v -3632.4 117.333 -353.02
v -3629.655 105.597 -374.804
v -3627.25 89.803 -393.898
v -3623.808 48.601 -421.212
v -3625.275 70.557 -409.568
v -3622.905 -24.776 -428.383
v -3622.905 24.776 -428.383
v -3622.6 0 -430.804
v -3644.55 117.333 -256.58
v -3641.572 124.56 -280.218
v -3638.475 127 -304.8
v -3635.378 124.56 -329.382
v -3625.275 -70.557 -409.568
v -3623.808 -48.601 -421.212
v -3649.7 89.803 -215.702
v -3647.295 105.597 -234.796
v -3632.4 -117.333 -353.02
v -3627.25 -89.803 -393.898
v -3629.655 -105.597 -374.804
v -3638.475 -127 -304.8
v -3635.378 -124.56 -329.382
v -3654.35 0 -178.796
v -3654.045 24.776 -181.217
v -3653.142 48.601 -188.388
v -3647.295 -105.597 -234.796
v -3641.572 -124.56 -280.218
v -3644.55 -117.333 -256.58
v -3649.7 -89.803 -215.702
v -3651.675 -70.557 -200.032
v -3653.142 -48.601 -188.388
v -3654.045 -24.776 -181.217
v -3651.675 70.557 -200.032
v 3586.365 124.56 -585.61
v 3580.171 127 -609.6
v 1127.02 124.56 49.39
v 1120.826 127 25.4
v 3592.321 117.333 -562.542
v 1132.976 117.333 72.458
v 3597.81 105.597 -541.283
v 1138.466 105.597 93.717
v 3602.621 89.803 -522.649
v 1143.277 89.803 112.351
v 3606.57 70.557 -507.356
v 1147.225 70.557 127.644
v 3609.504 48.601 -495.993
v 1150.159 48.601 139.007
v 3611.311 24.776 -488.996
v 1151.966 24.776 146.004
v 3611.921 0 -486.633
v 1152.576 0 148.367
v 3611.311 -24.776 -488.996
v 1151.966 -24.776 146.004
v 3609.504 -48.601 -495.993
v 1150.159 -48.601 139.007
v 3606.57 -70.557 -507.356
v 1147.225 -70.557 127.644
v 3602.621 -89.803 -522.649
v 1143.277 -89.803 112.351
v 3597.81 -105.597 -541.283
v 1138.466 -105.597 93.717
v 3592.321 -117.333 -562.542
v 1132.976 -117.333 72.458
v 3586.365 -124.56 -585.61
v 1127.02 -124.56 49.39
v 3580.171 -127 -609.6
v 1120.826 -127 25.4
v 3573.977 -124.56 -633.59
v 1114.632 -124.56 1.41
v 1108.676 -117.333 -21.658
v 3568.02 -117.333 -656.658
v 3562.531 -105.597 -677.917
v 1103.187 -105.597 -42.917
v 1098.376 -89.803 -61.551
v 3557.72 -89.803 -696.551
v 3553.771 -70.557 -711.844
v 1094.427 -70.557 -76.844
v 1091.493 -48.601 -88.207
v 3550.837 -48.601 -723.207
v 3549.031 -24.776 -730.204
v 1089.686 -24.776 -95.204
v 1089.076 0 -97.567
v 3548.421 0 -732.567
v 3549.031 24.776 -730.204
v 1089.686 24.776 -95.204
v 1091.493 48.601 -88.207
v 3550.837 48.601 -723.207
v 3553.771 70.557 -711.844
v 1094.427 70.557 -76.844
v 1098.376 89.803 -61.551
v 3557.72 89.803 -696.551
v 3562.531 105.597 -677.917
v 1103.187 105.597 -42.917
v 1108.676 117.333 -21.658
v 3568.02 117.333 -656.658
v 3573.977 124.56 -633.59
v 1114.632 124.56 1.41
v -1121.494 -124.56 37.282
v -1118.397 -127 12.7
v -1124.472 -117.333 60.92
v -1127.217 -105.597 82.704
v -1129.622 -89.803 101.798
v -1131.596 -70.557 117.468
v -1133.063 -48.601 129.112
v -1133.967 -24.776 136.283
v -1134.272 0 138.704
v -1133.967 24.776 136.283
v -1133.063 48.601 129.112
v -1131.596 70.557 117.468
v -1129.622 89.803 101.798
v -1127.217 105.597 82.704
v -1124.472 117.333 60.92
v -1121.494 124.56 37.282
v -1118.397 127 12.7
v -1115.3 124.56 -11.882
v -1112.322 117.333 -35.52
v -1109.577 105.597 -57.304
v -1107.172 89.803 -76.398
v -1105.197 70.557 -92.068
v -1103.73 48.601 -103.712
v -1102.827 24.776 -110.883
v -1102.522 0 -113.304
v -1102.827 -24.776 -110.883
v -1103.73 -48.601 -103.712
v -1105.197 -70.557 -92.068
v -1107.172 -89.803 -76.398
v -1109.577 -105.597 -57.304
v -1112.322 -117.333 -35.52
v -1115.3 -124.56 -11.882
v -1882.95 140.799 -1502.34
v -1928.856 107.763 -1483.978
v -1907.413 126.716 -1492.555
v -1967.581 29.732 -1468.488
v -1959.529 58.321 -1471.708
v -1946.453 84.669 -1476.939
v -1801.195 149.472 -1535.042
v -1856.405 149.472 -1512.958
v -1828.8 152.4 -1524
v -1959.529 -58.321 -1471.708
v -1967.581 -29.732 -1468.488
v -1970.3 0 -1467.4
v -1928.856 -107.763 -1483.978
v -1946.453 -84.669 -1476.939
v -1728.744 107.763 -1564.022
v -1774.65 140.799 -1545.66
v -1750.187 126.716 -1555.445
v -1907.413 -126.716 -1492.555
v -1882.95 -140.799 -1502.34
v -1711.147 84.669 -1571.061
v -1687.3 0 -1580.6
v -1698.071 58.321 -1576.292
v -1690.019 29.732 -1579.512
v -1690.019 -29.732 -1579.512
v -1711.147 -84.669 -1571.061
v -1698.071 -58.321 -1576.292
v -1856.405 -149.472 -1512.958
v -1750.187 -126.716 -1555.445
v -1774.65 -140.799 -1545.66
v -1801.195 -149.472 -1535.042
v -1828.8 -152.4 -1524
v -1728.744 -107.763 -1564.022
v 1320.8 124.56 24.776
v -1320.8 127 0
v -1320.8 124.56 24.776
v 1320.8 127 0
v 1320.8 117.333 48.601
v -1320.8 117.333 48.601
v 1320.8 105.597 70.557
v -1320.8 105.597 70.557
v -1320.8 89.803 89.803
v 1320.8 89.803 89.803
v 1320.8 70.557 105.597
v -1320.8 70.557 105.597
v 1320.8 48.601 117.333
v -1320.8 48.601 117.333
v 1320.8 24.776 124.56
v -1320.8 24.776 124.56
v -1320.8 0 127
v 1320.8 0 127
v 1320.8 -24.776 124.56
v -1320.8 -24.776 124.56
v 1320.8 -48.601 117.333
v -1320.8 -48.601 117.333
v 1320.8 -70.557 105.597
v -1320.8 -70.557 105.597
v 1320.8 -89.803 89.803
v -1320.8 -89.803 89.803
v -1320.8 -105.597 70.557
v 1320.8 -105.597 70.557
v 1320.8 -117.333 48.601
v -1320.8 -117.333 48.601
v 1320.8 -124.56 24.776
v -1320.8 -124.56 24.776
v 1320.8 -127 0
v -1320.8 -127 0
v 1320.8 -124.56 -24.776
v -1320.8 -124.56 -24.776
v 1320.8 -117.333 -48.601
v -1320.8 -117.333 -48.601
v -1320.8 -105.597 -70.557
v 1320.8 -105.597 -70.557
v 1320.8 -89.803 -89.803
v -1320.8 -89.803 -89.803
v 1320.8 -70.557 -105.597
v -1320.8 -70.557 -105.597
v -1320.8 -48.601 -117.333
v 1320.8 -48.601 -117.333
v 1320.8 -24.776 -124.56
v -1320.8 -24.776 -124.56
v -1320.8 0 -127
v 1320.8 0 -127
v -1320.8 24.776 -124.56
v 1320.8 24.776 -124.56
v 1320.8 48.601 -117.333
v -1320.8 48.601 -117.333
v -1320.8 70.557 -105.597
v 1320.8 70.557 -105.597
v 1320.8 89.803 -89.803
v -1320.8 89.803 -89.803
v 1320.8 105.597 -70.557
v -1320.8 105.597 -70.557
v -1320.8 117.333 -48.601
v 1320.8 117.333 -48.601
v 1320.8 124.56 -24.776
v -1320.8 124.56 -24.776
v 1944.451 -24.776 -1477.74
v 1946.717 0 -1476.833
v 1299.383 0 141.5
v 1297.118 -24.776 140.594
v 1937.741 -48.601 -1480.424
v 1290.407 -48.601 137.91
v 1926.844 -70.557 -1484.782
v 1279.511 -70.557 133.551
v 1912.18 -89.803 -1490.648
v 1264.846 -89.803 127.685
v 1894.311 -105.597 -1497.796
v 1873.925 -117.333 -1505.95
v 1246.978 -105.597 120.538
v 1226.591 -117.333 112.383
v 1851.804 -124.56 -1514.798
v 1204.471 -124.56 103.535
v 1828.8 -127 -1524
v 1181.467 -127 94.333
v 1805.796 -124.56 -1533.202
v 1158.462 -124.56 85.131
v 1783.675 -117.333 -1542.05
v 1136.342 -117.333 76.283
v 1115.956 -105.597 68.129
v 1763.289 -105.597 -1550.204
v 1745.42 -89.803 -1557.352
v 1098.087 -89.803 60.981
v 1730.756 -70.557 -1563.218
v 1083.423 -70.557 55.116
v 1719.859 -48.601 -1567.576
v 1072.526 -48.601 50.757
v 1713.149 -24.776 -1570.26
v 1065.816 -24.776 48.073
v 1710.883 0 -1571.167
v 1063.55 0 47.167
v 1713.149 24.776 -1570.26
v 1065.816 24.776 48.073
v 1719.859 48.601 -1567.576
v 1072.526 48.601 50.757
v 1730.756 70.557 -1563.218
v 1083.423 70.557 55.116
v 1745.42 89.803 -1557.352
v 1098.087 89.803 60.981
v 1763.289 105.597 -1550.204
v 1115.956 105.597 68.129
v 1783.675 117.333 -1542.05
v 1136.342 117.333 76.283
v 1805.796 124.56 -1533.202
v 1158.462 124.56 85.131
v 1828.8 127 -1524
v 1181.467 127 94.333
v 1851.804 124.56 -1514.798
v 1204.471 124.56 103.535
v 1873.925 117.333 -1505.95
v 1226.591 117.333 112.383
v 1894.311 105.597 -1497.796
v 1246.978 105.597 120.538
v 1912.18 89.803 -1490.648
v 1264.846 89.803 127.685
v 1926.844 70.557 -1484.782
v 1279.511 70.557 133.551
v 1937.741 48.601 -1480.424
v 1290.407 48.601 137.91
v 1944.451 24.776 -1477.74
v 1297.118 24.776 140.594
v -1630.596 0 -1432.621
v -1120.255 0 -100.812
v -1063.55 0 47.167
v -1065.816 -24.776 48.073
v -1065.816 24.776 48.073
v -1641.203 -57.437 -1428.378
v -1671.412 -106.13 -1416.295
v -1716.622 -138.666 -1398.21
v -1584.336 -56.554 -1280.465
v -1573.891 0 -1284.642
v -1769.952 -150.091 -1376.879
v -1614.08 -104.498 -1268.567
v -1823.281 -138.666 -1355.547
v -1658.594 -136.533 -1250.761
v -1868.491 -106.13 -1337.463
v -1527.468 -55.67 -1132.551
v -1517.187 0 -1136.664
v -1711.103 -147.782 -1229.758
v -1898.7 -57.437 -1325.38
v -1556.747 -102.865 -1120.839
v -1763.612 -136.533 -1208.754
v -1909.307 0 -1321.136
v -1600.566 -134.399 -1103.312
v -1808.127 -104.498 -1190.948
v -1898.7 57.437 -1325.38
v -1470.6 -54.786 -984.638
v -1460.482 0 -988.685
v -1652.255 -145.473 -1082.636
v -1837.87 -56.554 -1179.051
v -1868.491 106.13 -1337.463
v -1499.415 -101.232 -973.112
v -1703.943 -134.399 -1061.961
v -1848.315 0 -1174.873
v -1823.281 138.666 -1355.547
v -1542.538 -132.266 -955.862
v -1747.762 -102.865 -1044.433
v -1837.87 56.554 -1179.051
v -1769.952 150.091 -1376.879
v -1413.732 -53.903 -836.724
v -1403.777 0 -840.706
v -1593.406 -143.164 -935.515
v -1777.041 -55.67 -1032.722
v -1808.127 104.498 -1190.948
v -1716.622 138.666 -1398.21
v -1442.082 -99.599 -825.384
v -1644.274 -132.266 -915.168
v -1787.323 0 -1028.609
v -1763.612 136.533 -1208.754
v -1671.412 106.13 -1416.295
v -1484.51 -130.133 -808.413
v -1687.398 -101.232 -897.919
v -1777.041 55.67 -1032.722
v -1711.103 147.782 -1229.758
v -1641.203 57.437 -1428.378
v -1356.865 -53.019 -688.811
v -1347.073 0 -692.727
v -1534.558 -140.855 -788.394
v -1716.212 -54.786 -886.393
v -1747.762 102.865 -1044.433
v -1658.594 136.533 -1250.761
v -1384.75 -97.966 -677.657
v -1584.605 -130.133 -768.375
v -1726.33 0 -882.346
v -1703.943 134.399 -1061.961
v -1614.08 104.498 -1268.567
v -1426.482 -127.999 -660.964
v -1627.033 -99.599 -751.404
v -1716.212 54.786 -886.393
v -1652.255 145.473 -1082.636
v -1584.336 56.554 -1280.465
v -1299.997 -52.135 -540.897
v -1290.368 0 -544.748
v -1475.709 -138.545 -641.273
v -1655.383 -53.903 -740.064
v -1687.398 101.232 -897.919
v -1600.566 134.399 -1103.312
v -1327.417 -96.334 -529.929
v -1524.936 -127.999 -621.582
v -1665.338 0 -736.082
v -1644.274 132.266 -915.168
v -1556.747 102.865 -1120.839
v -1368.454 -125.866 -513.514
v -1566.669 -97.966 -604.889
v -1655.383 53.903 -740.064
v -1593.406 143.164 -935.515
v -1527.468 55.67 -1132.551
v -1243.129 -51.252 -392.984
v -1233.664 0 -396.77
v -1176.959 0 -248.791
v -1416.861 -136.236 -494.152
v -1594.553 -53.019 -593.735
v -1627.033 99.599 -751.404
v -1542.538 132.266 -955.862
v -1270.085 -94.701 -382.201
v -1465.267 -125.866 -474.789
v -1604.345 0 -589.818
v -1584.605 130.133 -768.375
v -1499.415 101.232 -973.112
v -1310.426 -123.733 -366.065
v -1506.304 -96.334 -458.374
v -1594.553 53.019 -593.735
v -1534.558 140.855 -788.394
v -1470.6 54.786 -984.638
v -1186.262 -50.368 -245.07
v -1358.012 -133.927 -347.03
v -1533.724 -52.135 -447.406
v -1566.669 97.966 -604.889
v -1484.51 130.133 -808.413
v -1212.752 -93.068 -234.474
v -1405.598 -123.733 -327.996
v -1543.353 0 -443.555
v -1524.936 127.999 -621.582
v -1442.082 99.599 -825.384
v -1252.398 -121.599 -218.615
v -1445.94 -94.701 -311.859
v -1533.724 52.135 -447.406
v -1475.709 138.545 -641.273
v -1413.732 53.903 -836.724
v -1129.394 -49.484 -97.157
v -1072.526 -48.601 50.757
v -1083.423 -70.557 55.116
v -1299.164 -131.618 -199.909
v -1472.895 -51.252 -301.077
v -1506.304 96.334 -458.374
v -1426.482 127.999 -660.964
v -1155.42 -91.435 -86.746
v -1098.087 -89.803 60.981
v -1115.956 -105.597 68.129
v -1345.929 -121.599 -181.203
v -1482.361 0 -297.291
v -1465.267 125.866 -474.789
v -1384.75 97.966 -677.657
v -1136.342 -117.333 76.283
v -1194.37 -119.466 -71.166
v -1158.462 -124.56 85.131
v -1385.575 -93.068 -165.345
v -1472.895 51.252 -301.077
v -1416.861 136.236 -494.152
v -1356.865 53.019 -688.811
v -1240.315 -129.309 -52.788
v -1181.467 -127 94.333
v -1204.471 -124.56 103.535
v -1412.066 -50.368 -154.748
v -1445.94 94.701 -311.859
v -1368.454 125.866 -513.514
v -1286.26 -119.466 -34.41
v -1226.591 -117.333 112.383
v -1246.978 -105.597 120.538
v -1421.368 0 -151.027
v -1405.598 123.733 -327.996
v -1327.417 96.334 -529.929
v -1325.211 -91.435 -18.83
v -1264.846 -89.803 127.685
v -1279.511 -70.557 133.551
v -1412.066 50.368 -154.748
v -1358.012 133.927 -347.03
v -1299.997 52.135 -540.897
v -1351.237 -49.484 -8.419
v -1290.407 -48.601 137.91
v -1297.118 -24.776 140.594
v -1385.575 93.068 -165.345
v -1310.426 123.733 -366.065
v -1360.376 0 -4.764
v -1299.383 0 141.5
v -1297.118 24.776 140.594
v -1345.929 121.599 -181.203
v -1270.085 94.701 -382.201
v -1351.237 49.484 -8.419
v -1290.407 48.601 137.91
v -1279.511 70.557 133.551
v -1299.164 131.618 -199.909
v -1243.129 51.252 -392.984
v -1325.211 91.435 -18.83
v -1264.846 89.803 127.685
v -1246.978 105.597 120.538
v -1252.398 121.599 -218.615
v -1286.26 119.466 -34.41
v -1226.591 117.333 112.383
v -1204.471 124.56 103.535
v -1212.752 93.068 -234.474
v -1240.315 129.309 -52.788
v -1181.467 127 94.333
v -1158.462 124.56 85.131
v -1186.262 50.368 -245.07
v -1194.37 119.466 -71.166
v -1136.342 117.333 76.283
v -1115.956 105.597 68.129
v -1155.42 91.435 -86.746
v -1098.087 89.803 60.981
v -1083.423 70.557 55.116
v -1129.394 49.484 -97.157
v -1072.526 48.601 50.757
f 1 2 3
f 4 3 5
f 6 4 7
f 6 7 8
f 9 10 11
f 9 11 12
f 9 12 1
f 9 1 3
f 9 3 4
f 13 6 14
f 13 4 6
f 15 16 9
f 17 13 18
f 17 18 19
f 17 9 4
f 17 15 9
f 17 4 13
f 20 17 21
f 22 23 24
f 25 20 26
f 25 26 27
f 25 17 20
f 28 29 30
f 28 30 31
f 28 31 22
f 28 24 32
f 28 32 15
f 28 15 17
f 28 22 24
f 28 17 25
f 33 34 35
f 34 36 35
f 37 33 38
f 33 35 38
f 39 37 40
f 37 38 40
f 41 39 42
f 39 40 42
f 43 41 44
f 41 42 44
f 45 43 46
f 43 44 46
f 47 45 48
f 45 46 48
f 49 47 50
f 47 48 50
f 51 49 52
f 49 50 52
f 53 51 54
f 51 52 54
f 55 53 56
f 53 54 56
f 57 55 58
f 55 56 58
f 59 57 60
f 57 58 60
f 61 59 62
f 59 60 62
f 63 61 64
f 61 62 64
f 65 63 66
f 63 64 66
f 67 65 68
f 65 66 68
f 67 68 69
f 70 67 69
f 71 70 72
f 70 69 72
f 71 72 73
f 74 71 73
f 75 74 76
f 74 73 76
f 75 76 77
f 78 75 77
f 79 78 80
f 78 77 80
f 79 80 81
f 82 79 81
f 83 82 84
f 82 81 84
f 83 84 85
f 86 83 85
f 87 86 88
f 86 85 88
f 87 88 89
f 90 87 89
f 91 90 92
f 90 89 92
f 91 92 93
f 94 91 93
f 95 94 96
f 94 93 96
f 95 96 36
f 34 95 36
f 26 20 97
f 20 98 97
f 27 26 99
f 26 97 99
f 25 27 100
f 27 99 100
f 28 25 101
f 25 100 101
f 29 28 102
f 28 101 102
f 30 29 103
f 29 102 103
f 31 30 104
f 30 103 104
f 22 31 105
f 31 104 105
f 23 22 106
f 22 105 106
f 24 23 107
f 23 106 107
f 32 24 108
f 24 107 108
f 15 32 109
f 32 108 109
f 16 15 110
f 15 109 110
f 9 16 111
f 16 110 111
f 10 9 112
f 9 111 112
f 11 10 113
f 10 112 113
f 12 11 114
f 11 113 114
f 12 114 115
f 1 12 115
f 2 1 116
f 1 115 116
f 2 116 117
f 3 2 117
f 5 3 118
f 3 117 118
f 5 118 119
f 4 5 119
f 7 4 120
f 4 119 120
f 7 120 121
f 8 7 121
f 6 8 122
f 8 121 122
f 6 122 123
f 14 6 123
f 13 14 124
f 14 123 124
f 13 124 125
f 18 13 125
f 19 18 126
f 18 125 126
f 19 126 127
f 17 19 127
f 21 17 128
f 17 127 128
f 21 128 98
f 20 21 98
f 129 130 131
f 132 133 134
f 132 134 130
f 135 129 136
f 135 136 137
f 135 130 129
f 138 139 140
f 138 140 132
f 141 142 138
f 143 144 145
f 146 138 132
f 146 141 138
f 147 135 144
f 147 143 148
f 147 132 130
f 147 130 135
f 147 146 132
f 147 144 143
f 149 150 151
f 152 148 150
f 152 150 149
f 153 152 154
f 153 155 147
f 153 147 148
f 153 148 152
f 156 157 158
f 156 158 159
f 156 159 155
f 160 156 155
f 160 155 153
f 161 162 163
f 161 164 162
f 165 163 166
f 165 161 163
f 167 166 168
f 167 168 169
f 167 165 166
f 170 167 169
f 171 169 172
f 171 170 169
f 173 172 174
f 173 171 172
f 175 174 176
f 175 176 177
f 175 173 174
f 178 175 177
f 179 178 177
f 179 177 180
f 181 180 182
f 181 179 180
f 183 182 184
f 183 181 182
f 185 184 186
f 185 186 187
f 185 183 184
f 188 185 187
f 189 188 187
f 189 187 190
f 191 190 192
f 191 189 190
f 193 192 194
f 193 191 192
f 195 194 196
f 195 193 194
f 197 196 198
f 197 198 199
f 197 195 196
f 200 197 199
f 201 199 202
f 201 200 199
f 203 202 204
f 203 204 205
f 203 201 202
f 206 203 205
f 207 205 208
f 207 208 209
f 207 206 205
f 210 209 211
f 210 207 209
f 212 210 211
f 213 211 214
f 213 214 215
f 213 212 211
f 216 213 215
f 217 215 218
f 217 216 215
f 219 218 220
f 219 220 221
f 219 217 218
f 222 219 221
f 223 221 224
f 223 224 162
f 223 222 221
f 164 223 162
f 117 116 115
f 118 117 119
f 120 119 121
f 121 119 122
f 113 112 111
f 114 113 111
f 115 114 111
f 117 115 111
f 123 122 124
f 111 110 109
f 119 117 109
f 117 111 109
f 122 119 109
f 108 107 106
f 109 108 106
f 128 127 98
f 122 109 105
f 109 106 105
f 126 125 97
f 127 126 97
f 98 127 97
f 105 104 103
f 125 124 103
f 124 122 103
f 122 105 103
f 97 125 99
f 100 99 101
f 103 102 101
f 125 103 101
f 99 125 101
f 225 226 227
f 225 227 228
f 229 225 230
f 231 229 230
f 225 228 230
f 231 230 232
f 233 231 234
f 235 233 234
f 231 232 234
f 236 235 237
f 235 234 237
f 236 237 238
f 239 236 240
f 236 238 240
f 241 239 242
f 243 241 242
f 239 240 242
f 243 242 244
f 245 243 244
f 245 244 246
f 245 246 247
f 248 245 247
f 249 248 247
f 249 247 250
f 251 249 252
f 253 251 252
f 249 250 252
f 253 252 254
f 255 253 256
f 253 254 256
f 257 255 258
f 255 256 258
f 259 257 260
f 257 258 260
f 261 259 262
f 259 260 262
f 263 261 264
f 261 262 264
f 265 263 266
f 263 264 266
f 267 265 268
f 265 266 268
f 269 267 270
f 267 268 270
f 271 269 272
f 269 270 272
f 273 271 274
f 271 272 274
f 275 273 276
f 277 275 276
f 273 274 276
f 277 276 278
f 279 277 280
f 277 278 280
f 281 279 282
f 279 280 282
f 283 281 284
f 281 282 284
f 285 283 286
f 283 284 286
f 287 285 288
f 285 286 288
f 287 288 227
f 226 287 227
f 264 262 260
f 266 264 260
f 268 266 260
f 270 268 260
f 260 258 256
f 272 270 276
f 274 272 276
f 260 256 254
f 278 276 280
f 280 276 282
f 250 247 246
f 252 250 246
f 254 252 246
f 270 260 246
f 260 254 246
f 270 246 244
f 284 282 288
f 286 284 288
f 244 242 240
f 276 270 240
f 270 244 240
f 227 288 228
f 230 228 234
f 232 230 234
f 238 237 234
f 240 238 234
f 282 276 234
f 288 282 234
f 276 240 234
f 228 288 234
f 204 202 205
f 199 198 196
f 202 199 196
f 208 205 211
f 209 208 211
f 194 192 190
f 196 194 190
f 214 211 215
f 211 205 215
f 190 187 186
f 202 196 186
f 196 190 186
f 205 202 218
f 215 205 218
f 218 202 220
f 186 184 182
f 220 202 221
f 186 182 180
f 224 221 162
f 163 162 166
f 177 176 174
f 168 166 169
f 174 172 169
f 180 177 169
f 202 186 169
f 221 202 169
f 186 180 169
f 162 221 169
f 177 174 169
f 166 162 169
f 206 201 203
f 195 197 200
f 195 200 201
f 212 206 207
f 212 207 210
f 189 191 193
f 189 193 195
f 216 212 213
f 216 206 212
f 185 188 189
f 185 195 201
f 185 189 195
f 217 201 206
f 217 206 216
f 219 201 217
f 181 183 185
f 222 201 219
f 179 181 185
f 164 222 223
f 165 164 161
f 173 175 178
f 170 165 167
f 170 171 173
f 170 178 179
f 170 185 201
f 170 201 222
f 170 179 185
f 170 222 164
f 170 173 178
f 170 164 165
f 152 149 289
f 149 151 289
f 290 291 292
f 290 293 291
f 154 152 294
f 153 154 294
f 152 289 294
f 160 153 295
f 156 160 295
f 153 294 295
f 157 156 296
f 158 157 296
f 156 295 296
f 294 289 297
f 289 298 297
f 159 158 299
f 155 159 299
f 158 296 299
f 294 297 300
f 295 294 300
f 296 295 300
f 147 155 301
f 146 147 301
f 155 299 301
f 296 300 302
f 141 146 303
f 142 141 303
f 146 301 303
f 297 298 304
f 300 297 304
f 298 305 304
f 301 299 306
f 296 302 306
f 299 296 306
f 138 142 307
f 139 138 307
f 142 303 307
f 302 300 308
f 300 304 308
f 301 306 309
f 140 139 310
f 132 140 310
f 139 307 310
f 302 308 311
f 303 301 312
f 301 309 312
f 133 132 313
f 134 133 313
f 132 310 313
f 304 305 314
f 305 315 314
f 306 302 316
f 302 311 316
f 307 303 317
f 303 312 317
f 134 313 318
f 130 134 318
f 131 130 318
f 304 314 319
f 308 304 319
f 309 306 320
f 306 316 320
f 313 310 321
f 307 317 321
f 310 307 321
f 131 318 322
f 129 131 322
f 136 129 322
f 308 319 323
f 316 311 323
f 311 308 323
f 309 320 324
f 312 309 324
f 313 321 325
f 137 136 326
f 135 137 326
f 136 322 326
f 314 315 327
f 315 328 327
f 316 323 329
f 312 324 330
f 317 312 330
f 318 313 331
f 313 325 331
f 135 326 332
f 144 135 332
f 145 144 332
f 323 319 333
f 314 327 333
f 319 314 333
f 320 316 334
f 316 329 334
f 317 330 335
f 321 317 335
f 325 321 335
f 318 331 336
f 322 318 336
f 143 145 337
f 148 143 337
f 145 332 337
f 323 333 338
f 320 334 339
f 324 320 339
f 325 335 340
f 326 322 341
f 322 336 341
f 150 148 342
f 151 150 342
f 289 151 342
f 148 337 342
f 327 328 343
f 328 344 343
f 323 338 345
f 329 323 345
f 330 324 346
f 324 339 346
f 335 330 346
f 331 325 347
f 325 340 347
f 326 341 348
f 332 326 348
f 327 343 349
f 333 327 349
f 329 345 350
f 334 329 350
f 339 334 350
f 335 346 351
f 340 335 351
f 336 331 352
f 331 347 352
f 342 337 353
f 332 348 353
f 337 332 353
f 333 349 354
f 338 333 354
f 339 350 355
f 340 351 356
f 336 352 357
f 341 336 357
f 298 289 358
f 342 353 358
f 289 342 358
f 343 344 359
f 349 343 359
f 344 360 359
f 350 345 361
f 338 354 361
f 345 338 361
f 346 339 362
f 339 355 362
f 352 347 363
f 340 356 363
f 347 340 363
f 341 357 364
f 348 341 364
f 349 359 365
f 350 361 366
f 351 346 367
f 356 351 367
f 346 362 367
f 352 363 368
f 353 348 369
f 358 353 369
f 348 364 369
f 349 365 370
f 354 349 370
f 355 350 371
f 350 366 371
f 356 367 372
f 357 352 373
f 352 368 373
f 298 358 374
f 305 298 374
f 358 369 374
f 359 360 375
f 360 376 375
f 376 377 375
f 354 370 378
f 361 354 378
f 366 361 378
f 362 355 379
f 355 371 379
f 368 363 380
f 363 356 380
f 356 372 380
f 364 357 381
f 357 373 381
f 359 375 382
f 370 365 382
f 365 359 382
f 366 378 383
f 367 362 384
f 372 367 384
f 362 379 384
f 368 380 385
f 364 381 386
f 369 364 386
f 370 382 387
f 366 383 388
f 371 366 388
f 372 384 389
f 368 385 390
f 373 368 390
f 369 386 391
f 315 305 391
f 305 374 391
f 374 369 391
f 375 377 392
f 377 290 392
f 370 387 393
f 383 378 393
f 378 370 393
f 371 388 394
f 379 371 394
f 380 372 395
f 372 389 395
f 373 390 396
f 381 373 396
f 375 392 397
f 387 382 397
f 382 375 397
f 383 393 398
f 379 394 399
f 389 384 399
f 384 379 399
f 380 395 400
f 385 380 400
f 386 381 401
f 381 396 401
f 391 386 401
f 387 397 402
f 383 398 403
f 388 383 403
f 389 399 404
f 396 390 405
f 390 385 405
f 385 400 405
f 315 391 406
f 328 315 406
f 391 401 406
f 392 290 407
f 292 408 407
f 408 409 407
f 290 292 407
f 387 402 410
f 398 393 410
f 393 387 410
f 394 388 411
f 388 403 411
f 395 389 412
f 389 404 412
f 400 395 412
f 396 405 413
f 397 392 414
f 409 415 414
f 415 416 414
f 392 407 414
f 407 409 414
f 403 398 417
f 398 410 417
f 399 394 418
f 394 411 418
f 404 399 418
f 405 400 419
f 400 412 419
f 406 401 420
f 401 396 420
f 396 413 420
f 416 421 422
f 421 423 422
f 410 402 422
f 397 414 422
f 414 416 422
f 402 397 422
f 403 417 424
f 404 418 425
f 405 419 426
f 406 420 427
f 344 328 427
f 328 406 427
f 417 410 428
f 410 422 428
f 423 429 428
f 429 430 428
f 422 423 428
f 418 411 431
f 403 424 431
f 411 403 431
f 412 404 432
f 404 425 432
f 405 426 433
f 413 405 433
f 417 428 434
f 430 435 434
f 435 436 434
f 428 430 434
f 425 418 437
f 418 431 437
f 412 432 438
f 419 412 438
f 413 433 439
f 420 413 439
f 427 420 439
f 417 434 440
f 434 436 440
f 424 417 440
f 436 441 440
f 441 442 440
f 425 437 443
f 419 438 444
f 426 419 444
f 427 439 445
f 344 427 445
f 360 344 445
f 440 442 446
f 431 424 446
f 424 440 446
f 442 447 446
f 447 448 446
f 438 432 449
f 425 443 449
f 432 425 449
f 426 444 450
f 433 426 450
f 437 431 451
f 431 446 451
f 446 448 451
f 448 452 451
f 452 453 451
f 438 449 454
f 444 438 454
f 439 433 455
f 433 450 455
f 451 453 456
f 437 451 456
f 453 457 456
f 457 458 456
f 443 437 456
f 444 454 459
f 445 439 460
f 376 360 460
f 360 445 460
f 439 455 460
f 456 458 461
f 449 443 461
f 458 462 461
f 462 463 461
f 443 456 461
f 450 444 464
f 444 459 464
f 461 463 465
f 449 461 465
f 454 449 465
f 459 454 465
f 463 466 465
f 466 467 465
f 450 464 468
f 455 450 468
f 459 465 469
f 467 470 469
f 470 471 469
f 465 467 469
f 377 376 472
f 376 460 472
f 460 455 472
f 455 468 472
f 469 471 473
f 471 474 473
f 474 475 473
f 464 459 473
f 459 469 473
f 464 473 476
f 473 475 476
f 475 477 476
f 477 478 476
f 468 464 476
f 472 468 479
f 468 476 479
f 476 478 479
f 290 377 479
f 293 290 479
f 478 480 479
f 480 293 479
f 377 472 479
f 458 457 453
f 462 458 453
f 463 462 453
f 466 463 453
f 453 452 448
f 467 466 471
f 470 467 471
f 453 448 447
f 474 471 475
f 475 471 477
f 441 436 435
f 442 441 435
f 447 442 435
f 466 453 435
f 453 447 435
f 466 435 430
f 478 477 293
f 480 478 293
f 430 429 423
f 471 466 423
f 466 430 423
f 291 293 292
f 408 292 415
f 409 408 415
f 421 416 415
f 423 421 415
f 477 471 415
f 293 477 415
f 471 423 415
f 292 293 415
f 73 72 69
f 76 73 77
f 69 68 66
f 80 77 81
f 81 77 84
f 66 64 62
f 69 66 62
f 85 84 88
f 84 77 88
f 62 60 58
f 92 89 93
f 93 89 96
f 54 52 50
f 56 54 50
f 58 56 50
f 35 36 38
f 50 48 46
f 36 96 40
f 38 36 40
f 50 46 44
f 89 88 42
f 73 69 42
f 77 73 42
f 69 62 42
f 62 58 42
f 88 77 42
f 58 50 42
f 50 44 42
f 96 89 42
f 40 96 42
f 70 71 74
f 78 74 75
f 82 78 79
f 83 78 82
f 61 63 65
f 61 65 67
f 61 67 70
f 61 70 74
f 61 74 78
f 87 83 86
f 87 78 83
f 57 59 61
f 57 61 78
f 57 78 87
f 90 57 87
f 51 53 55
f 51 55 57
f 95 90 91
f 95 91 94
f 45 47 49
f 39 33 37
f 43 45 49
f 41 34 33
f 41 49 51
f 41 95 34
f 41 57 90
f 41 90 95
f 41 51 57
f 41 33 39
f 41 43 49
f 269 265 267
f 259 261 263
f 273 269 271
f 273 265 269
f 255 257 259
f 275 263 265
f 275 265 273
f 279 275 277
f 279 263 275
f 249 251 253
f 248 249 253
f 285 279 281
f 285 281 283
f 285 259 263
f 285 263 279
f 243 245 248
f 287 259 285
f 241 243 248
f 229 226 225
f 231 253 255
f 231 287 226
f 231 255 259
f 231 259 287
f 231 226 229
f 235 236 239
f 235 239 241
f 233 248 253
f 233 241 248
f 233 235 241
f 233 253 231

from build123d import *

# Parameters (mm, degrees)
F3_R  = 127
F4_R  = 127
F8_R  = 152.4
F9_R  = 127
F14_R = 127
F13_R = 127
F18_R = 127
F19_R = 127
F24_R = 127
F23_R = 127


with BuildPart() as f5:
    # F3 (on line) → F5 section 0
    with BuildSketch(Plane(origin=(-3619.4249988375, 0, -456.0046874273), x_dir=(0, -1, 0), z_dir=(-0.9921567416, 0, -0.125))):
        with Locations((0, 152.4)):
            Circle(F3_R)
    # F4 (on line) → F5 section 1
    with BuildSketch(Plane(origin=(-1099.3468750484, 0, -138.5046874273), x_dir=(0, -1, 0), z_dir=(-0.9921567416, 0, -0.125))):
        with Locations((0, 152.4)):
            Circle(F4_R)
    loft()


with BuildPart() as f10:
    # F8 (on line) → F10 section 0
    with BuildSketch(Plane(origin=(-777.7655172414, 0, -1944.4137931034), x_dir=(0.9284766909, 0, -0.3713906764), z_dir=(-0.3713906764, 0, -0.9284766909))):
        with Locations((-1131.9987815273, 0)):
            Circle(F8_R)
    # F9 (on line) → F10 section 1
    with BuildSketch(Plane(origin=(-130.4322245238, 0, -326.0805613095), x_dir=(0.9284766909, 0, -0.3713906764), z_dir=(-0.3713906764, 0, -0.9284766909))):
        with Locations((-1131.9987815273, 0)):
            Circle(F9_R)
    loft()


with BuildPart() as f15:
    # F14 (on line) → F15 section 0
    with BuildSketch(Plane.YZ.offset(-1320.8)):
        Circle(F14_R)
    # F13 (on line) → F15 section 1
    with BuildSketch(Plane.YZ.offset(1320.8)):
        Circle(F13_R)
    loft()


with BuildPart() as f20:
    # F18 (on line) → F20 section 0
    with BuildSketch(Plane(origin=(3503.970647848, 0, -904.721330981), x_dir=(0, 1, 0), z_dir=(0.9682458366, 0, -0.25))):
        with Locations((0, 304.8)):
            Circle(F18_R)
    # F19 (on line) → F20 section 1
    with BuildSketch(Plane(origin=(1044.6262230063, 0, -269.721330981), x_dir=(0, 1, 0), z_dir=(0.9682458366, 0, -0.25))):
        with Locations((0, 304.8)):
            Circle(F19_R)
    loft()


with BuildPart() as f25:
    # F24 (on line) → F25 section 0
    with BuildSketch(Plane(origin=(777.7655172414, 0, -1944.4137931034), x_dir=(0.9284766909, 0, 0.3713906764), z_dir=(0.3713906764, 0, -0.9284766909))):
        with Locations((1131.9987815273, 0)):
            Circle(F24_R)
    # F23 (on line) → F25 section 1
    with BuildSketch(Plane(origin=(130.4322245238, 0, -326.0805613095), x_dir=(0.9284766909, 0, 0.3713906764), z_dir=(0.3713906764, 0, -0.9284766909))):
        with Locations((1131.9987815273, 0)):
            Circle(F23_R)
    loft()


solid = Compound([f5.part, f10.part, f15.part, f20.part, f25.part])
